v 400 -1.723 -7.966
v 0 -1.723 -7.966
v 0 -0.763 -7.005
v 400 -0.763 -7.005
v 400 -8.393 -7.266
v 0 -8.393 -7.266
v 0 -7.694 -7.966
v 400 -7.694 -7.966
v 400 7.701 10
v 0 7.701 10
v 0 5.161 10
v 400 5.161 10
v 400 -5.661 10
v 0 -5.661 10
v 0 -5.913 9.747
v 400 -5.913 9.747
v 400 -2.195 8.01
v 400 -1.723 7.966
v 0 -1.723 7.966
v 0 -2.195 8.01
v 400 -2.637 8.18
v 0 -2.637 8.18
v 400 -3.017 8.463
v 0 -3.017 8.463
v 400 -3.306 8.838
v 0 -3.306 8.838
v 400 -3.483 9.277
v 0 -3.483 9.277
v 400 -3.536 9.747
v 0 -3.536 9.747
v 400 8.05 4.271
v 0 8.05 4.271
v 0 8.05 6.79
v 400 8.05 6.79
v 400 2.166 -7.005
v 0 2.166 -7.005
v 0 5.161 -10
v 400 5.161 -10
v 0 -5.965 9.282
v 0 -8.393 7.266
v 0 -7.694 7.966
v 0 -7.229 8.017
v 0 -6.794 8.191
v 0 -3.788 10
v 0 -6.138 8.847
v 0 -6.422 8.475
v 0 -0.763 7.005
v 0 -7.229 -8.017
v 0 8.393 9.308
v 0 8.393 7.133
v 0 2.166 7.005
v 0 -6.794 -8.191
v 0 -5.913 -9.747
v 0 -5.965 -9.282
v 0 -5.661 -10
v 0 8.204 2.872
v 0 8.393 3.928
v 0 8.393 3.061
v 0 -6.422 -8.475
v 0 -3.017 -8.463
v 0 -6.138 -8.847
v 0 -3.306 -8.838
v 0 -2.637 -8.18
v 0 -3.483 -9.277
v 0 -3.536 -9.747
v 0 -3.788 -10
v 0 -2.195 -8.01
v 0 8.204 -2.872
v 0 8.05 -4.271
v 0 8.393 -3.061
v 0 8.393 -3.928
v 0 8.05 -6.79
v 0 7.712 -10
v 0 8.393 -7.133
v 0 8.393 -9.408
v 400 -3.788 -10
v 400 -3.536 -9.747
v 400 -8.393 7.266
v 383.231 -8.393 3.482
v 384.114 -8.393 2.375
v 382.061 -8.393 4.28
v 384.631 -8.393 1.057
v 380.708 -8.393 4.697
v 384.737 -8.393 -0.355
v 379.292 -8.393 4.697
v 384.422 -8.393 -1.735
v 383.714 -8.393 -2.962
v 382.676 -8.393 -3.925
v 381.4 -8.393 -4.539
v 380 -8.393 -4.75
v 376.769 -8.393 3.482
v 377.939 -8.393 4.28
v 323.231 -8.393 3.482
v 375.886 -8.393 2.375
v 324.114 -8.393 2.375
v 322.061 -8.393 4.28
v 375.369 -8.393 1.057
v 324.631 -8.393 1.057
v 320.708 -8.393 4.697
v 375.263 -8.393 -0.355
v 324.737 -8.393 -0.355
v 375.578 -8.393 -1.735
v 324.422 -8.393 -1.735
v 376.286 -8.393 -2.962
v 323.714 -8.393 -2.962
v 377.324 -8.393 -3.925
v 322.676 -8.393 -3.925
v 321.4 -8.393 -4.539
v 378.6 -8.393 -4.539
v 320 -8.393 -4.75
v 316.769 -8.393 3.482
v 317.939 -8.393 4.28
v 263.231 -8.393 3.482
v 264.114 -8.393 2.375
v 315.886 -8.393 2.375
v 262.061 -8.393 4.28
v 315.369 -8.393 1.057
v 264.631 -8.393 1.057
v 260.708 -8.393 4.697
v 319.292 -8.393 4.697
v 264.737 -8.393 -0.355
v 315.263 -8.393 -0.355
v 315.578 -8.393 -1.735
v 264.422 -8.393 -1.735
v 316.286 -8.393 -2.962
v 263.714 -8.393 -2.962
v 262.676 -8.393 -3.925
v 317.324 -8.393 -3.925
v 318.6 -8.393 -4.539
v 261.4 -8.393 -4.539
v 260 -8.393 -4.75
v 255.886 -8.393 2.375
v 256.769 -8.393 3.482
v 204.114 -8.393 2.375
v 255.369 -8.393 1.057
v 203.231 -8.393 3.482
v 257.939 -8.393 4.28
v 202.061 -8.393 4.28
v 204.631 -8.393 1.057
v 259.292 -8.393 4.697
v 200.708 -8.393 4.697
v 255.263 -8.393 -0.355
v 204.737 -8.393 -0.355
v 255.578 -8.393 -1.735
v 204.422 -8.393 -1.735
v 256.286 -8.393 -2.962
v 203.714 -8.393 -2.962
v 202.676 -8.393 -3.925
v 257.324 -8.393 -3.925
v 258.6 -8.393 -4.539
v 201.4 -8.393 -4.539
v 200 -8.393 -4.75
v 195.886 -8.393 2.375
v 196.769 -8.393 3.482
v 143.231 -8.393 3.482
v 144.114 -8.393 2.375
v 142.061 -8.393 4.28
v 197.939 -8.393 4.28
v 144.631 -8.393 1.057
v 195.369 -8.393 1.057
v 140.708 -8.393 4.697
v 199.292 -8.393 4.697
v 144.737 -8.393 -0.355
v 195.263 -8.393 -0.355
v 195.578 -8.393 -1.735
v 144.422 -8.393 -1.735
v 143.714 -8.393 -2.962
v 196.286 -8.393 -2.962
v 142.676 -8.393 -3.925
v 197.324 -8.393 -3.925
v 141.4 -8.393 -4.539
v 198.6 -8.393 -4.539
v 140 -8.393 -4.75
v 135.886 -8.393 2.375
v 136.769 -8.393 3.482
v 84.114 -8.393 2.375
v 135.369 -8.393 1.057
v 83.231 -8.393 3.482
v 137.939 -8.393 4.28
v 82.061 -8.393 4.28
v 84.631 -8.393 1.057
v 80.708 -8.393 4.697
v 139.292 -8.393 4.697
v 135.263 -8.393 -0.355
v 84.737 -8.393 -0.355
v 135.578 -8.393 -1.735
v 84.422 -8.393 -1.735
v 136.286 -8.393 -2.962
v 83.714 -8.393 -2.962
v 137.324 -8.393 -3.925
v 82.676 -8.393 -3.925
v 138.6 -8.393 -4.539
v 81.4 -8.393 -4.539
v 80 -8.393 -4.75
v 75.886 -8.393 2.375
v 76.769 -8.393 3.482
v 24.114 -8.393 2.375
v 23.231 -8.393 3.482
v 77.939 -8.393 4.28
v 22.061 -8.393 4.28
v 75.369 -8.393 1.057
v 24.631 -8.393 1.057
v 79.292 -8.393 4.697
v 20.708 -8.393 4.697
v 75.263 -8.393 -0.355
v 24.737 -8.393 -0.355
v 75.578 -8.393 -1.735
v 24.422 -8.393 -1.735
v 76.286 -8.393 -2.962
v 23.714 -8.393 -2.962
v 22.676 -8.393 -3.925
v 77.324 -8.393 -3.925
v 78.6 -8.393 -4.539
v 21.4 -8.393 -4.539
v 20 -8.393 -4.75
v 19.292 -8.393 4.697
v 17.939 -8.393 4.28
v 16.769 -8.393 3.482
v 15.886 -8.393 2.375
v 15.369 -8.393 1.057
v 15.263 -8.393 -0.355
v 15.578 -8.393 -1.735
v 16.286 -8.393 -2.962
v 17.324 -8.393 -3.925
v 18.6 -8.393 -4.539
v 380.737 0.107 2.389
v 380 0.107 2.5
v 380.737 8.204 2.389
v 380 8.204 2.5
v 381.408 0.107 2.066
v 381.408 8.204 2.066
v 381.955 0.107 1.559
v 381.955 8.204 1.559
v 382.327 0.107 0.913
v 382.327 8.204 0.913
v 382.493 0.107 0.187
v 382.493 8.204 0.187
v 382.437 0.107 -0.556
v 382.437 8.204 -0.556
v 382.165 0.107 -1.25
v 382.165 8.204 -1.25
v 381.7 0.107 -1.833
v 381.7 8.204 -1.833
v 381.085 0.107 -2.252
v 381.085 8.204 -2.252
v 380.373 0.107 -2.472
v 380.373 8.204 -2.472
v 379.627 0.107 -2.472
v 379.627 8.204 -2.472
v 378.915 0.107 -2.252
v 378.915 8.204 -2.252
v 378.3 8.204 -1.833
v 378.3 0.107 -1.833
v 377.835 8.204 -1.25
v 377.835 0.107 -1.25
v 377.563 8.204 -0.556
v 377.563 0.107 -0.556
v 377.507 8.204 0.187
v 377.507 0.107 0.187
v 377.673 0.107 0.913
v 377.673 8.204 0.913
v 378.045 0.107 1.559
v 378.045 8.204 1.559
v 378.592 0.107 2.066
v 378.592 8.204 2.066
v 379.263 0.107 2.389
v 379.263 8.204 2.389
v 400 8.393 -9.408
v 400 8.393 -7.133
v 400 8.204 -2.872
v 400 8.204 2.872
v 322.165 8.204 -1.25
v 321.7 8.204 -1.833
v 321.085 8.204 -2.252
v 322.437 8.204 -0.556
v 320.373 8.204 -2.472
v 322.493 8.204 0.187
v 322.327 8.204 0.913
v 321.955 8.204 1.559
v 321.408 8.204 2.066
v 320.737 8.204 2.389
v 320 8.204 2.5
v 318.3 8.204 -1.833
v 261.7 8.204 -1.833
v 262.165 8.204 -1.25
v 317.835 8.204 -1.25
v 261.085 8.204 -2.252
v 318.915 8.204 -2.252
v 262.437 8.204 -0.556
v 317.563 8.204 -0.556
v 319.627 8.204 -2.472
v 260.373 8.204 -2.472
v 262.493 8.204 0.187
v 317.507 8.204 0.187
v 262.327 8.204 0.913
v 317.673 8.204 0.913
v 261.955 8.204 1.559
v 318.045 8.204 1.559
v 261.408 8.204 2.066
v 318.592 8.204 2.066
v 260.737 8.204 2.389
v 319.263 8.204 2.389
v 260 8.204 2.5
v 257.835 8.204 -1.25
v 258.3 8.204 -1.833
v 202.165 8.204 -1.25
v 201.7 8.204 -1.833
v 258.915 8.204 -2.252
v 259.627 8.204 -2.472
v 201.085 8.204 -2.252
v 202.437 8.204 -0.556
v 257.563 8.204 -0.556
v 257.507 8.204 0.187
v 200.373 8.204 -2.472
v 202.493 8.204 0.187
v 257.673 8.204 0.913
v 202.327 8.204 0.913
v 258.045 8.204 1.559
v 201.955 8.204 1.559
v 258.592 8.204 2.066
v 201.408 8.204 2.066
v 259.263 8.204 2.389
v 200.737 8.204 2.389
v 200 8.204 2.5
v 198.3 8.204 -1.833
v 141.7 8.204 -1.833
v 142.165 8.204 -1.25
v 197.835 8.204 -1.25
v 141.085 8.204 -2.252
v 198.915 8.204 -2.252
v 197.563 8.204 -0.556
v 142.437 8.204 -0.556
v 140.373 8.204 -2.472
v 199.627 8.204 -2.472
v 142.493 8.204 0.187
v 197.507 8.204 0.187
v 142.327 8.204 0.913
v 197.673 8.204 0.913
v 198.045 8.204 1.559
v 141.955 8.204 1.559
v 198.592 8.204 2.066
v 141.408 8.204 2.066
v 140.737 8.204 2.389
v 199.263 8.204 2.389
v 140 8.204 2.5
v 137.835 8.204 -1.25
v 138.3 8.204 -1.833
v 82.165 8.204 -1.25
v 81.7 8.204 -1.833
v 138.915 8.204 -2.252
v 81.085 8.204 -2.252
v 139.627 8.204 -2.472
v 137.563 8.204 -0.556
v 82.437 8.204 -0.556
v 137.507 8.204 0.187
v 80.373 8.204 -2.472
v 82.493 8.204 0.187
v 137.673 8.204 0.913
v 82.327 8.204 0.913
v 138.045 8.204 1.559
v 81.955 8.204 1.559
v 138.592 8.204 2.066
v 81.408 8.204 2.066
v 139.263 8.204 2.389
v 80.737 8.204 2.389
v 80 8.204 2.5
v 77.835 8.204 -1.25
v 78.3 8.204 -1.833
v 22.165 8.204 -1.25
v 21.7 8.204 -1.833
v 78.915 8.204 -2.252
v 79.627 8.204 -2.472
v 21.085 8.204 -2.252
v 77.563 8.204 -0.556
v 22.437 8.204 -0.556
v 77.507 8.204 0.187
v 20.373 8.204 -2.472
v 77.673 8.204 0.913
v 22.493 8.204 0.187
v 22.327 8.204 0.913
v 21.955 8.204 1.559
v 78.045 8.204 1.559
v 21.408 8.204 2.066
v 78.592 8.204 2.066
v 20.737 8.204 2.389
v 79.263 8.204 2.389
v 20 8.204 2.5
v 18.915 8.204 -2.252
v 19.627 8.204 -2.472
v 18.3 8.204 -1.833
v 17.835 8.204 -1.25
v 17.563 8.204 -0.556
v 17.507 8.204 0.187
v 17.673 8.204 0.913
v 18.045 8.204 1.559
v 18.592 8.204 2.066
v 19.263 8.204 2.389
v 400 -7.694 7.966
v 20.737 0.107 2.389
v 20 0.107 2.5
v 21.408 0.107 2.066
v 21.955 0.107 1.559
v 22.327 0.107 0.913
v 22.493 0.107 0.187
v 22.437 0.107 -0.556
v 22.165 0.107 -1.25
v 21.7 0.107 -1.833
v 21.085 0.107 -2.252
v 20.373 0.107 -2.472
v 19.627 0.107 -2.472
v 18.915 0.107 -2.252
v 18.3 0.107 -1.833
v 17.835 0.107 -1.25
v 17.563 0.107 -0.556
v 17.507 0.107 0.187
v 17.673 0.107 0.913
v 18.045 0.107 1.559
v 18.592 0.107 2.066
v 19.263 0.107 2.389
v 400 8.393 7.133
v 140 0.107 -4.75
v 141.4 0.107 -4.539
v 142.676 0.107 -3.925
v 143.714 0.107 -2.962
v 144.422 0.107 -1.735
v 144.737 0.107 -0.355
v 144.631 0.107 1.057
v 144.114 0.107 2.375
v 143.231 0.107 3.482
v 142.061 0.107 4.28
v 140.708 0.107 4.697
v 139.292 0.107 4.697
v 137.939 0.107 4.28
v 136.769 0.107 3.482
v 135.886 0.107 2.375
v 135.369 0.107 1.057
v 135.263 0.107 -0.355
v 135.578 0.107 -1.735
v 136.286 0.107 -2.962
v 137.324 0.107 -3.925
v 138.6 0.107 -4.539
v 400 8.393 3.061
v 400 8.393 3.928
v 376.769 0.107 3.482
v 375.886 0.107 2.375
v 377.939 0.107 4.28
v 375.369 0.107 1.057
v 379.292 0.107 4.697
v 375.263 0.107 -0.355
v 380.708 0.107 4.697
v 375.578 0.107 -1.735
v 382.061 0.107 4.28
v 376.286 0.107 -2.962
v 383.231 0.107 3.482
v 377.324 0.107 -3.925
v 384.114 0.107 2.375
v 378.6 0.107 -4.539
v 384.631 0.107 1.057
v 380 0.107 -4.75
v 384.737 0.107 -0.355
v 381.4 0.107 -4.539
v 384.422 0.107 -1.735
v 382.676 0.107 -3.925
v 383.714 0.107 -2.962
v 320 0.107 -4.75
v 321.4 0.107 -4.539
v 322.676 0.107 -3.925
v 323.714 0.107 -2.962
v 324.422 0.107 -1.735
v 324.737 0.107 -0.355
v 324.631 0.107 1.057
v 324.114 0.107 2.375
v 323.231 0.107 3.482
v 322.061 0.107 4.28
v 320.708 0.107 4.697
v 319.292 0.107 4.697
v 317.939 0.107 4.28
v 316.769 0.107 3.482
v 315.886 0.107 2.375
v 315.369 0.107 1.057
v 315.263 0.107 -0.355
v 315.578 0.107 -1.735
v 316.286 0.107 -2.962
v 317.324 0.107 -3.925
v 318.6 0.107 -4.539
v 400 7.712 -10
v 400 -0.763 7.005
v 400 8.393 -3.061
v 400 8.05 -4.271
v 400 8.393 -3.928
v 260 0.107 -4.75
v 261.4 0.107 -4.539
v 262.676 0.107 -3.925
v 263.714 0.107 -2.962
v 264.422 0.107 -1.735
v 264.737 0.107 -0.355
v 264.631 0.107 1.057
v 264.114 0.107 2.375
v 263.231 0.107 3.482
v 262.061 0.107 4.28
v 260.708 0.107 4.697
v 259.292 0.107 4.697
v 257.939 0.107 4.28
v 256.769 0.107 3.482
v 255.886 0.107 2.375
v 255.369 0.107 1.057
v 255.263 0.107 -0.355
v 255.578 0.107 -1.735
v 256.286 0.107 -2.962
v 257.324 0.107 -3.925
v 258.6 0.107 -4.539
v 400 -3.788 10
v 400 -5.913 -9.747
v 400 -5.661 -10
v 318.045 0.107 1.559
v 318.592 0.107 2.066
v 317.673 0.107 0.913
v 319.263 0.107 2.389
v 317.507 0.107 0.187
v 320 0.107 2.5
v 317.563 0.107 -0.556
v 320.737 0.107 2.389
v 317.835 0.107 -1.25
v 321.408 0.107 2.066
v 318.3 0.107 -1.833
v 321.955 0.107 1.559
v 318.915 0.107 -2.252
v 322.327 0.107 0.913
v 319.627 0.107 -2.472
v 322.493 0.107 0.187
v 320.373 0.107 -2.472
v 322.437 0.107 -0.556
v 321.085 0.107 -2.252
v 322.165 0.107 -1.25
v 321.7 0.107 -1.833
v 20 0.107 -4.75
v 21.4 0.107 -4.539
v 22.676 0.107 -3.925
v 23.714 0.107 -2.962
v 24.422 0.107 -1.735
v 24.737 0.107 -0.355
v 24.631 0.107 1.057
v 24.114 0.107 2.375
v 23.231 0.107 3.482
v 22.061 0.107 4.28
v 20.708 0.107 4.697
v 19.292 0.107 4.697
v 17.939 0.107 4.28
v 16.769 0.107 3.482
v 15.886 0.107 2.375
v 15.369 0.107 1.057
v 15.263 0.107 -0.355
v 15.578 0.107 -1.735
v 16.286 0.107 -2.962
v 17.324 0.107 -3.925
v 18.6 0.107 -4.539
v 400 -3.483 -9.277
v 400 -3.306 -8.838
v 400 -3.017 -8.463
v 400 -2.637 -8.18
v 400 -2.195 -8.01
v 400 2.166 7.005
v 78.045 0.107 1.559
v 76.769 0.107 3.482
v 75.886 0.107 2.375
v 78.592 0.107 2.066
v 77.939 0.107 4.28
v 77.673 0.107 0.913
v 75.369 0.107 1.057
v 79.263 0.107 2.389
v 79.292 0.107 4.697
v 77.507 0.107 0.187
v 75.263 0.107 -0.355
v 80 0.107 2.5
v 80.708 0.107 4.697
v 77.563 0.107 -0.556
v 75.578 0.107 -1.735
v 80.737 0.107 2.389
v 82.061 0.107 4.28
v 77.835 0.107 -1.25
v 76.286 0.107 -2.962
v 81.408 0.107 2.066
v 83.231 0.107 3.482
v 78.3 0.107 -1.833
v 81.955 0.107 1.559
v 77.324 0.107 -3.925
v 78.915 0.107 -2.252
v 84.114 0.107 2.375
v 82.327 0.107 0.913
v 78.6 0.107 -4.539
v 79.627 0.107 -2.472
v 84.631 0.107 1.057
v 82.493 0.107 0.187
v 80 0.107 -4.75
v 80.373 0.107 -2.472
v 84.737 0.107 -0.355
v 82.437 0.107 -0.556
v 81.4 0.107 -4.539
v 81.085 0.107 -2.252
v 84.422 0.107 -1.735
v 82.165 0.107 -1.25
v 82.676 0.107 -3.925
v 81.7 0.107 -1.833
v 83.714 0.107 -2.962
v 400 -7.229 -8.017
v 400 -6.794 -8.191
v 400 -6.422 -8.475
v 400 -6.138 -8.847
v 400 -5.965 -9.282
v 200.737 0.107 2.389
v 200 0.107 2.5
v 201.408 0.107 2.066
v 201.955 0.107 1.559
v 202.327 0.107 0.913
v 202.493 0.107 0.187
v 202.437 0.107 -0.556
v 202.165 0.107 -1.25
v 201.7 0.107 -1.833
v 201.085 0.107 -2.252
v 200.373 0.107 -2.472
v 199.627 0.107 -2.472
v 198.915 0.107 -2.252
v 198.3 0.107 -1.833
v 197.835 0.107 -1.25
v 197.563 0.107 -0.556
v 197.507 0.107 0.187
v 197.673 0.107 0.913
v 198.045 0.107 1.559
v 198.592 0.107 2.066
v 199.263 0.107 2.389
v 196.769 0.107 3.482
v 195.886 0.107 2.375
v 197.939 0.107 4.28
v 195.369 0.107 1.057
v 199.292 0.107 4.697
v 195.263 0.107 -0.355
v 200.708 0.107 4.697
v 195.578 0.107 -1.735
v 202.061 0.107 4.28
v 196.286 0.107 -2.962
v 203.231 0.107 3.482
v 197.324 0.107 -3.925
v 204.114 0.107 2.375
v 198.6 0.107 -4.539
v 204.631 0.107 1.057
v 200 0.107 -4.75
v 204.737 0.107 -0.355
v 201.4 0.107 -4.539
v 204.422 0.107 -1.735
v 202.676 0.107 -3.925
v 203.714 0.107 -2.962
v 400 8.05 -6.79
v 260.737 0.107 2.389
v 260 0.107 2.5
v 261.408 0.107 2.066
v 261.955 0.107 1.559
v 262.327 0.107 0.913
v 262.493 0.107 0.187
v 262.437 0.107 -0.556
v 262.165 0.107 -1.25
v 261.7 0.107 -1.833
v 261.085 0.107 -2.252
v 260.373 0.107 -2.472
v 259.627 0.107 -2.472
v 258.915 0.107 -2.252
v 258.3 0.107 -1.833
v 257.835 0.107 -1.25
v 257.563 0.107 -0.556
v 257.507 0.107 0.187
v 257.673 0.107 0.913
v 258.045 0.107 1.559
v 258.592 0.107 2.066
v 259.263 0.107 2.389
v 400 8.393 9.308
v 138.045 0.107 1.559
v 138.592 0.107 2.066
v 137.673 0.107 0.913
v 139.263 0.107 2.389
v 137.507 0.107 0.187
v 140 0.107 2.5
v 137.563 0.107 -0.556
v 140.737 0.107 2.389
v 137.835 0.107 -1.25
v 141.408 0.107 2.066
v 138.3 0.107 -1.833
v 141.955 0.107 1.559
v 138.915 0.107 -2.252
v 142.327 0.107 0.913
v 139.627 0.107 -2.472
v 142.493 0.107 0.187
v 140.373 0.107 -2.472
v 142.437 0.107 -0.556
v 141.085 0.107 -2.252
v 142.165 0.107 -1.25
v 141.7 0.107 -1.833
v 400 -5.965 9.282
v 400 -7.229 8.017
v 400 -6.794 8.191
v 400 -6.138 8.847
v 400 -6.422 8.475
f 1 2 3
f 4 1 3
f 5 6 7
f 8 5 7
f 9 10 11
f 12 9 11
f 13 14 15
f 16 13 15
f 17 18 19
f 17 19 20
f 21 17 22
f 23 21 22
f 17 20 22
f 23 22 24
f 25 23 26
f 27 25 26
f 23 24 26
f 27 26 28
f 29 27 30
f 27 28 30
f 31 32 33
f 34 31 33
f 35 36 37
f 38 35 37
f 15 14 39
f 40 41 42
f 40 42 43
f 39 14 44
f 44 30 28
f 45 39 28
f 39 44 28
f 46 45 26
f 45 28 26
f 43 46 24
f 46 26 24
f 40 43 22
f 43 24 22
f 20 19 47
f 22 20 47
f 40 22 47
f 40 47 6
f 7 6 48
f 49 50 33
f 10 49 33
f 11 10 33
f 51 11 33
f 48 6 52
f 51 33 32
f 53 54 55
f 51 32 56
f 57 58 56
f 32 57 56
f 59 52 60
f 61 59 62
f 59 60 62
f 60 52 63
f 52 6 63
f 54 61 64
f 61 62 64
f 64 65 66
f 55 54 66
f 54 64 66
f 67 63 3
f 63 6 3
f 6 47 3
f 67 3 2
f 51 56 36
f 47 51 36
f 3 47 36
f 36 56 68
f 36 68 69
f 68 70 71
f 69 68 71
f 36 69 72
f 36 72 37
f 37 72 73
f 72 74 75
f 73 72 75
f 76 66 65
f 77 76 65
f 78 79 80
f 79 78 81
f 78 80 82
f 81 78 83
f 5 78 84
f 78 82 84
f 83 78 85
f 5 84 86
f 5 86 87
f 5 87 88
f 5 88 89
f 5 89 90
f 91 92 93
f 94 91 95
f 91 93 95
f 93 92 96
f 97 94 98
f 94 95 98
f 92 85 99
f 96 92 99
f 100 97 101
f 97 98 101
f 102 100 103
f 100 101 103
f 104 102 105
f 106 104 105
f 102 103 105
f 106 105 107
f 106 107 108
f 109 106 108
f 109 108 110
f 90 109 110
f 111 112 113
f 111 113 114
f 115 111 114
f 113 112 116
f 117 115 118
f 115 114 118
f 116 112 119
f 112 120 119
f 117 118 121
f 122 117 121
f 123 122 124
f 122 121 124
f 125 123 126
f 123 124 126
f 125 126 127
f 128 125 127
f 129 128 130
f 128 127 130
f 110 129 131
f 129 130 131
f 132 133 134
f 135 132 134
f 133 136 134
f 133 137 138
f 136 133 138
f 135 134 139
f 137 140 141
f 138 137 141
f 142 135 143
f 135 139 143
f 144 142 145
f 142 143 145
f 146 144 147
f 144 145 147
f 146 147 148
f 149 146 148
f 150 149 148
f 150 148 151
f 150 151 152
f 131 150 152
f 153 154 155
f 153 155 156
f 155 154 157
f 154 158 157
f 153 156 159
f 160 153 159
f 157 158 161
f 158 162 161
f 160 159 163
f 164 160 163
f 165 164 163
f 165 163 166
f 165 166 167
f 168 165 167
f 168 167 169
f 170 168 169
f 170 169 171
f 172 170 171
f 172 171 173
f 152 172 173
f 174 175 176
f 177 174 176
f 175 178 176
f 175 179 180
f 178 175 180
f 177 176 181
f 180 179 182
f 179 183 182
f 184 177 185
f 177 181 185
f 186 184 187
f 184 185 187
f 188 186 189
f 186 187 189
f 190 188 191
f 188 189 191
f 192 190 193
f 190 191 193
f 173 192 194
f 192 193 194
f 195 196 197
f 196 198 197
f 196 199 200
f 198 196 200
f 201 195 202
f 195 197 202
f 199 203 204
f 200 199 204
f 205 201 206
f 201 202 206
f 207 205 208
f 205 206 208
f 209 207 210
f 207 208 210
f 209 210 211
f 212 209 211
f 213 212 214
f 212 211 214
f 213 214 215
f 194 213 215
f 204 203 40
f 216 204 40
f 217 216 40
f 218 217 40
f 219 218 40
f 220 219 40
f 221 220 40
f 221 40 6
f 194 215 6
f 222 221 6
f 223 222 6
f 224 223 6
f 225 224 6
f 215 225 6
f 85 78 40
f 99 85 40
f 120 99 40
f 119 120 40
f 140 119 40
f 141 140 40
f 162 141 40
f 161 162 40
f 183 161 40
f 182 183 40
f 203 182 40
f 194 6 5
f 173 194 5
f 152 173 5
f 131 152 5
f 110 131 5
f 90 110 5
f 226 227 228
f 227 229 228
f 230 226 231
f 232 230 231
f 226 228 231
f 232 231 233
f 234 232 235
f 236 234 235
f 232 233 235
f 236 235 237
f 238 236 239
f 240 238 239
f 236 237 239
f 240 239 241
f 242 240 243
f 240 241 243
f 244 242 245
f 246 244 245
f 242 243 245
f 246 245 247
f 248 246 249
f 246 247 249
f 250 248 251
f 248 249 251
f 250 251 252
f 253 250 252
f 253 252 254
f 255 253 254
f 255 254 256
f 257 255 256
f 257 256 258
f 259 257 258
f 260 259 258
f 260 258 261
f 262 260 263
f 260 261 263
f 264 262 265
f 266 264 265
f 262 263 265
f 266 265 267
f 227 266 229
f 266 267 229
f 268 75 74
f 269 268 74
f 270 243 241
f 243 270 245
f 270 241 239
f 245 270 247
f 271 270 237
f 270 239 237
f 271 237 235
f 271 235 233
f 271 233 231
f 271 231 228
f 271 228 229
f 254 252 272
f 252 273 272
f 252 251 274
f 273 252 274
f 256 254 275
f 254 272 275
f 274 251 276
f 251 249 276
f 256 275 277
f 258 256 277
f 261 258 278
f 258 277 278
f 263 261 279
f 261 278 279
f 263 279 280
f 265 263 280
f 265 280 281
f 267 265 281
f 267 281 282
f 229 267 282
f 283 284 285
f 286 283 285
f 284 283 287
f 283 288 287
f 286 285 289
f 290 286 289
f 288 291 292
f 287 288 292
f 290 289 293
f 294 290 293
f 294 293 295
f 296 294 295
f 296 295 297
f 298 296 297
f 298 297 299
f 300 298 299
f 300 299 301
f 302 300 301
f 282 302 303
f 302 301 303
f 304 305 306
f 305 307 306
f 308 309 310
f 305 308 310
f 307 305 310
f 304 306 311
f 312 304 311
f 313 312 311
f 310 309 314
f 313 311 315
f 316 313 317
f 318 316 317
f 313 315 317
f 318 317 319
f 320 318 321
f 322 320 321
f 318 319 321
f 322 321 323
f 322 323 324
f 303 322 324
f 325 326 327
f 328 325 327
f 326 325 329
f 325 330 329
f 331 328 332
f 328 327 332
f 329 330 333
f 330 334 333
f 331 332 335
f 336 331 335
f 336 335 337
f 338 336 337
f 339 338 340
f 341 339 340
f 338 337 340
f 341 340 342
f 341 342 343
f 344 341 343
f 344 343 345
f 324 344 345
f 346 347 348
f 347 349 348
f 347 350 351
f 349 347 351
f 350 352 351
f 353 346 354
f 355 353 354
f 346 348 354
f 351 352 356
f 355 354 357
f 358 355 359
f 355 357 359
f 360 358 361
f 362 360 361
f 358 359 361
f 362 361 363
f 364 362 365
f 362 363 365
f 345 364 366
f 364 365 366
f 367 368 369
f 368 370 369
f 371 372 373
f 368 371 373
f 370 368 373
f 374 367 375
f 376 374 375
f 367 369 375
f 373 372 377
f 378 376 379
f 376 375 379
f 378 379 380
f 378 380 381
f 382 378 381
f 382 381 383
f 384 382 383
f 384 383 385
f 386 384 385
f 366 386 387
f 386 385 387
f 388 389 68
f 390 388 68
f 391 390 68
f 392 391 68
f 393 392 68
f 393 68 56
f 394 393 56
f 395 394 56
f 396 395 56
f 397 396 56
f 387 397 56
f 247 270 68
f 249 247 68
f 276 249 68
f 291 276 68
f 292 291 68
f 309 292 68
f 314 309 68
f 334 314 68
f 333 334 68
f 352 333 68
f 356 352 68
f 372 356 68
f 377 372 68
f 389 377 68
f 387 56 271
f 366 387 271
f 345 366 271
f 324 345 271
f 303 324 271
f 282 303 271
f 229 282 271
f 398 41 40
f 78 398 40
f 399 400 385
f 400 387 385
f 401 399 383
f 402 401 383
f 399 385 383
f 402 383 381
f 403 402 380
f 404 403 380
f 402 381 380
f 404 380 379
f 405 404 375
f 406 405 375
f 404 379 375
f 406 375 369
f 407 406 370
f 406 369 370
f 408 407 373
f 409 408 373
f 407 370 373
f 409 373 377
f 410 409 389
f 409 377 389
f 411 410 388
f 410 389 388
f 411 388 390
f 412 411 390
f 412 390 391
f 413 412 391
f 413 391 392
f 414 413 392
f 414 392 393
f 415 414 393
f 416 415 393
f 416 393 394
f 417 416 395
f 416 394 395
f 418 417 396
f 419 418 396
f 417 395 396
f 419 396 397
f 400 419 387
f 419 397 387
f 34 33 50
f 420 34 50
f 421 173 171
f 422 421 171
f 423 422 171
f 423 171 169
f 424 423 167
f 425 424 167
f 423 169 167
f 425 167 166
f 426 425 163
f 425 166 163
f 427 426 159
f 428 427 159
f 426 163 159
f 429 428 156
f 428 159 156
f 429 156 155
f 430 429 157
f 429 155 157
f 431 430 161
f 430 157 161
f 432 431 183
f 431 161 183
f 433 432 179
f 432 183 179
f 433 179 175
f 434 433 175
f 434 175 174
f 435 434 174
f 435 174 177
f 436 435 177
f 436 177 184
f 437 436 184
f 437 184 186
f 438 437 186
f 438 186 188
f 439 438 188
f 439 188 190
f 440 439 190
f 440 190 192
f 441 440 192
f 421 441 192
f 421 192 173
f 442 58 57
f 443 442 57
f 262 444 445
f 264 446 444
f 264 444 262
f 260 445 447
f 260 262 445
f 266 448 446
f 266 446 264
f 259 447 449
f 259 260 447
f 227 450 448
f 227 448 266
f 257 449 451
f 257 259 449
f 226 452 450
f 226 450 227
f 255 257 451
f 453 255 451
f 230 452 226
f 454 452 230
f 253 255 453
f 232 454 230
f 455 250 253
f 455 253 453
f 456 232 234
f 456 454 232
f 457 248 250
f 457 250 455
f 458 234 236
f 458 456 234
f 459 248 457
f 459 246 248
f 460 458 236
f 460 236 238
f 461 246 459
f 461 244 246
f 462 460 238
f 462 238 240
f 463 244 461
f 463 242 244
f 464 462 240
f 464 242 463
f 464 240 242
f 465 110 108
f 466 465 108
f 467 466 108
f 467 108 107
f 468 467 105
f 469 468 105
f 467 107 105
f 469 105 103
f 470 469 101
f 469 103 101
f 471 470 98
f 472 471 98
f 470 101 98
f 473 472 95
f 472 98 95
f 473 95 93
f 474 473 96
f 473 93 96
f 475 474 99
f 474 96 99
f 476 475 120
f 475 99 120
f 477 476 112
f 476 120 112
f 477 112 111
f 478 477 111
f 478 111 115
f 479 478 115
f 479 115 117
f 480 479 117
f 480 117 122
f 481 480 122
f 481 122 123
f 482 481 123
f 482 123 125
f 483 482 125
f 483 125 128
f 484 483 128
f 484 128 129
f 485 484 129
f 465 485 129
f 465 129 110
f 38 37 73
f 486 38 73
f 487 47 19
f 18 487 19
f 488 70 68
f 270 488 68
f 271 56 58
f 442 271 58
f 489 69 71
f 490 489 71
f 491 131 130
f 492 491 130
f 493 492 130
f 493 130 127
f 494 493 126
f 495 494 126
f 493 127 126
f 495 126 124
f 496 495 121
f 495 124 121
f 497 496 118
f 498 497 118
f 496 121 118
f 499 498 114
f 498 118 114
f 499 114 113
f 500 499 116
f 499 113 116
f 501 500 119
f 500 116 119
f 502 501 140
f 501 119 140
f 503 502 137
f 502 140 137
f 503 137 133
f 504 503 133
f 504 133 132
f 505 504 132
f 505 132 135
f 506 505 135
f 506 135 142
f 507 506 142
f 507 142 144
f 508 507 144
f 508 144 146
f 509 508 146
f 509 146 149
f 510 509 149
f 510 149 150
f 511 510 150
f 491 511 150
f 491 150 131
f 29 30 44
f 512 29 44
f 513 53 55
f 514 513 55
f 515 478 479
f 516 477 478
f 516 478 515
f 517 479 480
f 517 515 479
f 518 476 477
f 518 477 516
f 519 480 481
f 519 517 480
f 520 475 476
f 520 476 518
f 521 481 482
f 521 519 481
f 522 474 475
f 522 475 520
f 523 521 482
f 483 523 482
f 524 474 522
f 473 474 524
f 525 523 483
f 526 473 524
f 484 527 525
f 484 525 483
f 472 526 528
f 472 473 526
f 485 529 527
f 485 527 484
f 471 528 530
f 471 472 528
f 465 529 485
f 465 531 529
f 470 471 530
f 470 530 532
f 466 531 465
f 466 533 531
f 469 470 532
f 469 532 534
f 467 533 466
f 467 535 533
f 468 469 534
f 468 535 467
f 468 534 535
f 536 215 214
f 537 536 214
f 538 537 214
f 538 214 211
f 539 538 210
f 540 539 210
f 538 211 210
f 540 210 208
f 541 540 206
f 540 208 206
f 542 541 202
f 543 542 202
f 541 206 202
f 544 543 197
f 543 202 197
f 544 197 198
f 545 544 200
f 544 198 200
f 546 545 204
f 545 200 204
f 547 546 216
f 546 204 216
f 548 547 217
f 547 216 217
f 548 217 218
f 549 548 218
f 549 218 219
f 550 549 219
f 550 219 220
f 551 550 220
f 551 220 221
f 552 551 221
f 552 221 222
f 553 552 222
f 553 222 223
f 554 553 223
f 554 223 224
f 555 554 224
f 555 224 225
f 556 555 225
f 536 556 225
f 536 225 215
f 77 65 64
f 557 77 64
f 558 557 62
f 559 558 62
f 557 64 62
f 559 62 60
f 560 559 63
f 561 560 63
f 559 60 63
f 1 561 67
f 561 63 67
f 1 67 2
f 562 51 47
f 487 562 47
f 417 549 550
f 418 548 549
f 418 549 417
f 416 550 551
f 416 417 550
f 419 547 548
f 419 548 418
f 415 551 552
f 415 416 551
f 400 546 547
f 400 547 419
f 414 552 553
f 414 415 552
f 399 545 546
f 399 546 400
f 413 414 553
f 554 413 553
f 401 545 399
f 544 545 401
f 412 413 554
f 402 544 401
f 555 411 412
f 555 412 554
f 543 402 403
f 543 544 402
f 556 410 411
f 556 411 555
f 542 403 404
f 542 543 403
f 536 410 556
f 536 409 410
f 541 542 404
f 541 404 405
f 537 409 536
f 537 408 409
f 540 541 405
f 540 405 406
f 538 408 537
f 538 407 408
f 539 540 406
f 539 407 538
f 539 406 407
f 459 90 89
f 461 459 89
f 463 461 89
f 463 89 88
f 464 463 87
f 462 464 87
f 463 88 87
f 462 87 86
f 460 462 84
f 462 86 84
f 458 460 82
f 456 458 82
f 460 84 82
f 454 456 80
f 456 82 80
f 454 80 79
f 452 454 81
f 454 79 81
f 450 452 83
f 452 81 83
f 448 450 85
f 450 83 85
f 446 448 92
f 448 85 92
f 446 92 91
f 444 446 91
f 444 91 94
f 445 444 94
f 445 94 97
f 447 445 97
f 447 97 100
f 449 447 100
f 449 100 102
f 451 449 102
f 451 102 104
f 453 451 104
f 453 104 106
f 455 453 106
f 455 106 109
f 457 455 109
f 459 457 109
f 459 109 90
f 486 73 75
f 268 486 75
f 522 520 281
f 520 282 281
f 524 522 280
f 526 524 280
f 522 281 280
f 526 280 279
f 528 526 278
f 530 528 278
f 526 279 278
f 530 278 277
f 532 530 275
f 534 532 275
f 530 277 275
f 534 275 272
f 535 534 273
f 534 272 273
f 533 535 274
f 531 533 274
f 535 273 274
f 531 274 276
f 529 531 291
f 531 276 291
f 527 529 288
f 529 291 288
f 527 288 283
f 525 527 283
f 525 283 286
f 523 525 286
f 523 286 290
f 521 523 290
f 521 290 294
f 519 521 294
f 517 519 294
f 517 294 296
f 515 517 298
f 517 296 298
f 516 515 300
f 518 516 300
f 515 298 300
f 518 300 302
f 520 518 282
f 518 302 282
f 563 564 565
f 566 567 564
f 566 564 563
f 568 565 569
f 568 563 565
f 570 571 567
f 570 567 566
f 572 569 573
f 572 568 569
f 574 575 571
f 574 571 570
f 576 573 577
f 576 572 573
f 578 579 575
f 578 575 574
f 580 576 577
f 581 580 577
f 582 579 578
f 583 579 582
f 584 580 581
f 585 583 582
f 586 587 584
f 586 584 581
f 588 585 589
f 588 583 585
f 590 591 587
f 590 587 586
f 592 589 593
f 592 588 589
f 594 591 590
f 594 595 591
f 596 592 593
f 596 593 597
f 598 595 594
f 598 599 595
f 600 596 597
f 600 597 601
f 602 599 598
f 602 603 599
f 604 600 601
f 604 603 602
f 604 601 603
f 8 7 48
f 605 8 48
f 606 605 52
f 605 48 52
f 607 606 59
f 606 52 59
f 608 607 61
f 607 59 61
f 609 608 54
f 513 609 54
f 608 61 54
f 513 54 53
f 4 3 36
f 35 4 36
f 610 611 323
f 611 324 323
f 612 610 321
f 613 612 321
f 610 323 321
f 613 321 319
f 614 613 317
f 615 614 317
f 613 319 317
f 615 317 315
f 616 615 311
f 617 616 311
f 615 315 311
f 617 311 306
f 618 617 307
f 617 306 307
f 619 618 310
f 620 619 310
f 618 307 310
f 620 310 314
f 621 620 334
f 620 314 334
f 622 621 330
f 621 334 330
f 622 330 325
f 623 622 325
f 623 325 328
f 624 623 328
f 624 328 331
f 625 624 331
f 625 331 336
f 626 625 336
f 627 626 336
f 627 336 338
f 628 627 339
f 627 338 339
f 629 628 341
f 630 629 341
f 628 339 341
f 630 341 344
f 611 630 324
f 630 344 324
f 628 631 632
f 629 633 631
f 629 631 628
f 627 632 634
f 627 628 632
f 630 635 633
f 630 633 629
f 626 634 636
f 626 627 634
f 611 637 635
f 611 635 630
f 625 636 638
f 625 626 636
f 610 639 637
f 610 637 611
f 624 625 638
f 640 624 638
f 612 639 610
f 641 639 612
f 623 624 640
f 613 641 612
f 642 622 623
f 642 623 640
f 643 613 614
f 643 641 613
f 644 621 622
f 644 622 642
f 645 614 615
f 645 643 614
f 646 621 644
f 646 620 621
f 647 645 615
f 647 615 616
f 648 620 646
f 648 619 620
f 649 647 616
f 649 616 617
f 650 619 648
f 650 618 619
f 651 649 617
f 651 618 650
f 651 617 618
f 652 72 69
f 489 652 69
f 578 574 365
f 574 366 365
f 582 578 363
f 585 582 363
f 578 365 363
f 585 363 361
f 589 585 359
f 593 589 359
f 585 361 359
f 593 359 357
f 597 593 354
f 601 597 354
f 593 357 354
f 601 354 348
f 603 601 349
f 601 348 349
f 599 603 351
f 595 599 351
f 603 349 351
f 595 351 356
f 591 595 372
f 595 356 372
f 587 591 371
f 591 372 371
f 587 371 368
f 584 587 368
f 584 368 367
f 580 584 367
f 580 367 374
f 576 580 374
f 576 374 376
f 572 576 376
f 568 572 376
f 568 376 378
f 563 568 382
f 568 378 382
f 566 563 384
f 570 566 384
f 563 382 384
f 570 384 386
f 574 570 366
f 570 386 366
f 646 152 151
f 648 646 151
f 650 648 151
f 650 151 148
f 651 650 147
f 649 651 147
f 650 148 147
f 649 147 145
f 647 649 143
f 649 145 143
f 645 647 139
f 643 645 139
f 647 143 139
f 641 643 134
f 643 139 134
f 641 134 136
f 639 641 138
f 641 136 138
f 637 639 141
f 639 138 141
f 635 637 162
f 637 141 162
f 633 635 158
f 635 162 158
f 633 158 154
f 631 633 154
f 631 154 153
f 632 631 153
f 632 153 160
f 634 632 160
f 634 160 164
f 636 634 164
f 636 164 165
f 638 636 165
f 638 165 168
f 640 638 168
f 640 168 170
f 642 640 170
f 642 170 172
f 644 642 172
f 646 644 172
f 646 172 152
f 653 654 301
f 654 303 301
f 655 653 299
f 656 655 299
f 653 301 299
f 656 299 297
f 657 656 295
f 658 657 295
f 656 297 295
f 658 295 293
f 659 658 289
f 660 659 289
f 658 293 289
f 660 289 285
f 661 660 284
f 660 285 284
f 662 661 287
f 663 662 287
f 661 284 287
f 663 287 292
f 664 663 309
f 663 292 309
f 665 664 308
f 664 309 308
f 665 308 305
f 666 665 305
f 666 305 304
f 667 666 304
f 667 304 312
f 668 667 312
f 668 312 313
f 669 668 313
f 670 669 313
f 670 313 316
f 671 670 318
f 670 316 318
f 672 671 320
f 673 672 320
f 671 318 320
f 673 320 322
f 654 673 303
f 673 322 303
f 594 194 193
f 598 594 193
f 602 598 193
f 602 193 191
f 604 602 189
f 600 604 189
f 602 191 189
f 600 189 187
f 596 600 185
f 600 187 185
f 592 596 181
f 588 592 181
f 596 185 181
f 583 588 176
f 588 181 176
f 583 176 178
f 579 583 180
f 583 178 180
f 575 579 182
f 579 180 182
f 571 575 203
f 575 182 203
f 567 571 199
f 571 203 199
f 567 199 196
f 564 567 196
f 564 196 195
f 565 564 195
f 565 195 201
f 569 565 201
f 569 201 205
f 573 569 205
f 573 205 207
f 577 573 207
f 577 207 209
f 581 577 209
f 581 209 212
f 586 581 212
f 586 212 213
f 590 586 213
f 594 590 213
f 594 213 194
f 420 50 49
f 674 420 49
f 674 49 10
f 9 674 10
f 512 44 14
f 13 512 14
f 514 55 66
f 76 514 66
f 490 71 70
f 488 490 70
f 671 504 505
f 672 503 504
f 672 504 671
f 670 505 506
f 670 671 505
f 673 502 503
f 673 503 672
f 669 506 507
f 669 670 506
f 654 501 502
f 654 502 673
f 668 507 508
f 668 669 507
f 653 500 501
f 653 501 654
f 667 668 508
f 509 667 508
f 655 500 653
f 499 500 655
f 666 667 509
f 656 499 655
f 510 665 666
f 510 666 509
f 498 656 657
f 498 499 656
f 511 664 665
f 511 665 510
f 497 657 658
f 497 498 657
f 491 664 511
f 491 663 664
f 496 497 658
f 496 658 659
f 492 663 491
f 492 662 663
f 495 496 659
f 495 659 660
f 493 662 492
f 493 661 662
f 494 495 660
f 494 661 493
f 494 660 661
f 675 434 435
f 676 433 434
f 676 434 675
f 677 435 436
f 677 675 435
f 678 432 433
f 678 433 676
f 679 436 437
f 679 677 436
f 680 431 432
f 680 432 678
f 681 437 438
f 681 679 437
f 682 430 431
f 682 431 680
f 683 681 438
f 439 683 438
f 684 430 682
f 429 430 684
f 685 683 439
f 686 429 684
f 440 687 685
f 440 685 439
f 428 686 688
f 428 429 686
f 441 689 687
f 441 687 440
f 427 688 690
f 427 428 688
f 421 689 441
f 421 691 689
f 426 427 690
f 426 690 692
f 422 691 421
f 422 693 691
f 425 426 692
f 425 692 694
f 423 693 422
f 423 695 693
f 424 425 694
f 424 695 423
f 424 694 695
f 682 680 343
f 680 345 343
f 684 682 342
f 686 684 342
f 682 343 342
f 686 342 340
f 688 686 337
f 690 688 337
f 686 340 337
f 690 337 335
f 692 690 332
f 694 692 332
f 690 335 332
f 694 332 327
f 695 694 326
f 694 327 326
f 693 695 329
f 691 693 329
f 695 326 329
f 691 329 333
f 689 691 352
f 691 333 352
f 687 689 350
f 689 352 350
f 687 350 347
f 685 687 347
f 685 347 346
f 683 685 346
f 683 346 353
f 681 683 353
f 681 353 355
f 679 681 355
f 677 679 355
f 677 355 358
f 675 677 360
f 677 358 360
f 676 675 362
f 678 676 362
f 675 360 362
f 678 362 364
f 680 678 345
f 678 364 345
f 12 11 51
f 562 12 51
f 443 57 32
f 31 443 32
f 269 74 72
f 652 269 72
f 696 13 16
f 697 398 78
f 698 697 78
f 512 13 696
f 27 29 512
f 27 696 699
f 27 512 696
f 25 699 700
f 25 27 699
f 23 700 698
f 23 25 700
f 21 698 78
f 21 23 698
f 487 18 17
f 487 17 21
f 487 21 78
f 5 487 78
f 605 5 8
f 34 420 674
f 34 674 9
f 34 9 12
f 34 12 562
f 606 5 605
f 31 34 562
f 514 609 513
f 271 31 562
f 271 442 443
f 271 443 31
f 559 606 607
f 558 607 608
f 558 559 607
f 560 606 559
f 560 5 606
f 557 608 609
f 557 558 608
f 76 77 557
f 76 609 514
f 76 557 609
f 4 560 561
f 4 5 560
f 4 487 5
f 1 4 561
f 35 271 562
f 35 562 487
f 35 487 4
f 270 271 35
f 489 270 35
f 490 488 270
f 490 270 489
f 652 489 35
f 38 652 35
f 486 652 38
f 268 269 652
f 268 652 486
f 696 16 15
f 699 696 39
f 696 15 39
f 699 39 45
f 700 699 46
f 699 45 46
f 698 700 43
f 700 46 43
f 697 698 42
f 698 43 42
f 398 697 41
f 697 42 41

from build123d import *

# Parameters (mm, degrees)
BOSS_EXTRUDE1_DEPTH = 400
HOLE1_D             = 5
HOLE1_CBORE_D       = 9.5
HOLE1_CBORE_DEPTH   = 8.5
LPATTERN1_COUNT     = 7
LPATTERN1_PITCH     = 60


with BuildPart() as part:
    # Sketch1 → Boss-Extrude1 (new body)
    with BuildSketch(Plane(origin=(0, 0, 0), x_dir=(0, 0, -1), z_dir=(1, 0, 0))):
        with BuildLine():
            Line((-7.965754986, -7.693975449), (-7.266272068, -8.393458366))
            Line((-7.266272068, -8.393458366), (7.266272068, -8.393458366))
            Line((7.266272068, -8.393458366), (7.965754986, -7.693975449))
            ThreePointArc((7.965754986, -7.693975449), (8.474723757, -6.421557866), (9.747437917, -5.913331162))
            Line((9.747437917, -5.913331162), (10.000000437, -5.660768637))
            Line((10.000000437, -5.660768637), (10.000000437, -3.788406023))
            Line((10.000000437, -3.788406023), (9.747437912, -3.535843503))
            ThreePointArc((9.747437912, -3.535843503), (8.462742055, -3.016656911), (7.965755402, -1.72321096))
            Line((7.965755402, -1.72321096), (7.005148341, -0.762603918))
            Line((7.005148341, -0.762603918), (7.005148341, 2.166206023))
            Line((7.005148341, 2.166206023), (10.000000347, 5.161058089))
            Line((10.000000347, 5.161058089), (10.000000347, 7.712387211))
            Line((10.000000347, 7.712387211), (9.408464779, 8.393458268))
            Line((9.408464779, 8.393458268), (7.133016457, 8.393458268))
            Line((7.133016457, 8.393458268), (6.789534443, 8.049976247))
            Line((6.789534443, 8.049976247), (4.271139656, 8.049976247))
            Line((4.271139656, 8.049976247), (3.927707784, 8.393458265))
            Line((3.927707784, 8.393458265), (3.061282509, 8.393458265))
            Line((3.061282509, 8.393458265), (2.872049327, 8.204225079))
            Line((2.872049327, 8.204225079), (-2.87204886, 8.204225079))
            Line((-2.87204886, 8.204225079), (-3.061282046, 8.393458261))
            Line((-3.061282046, 8.393458261), (-3.927707321, 8.393458261))
            Line((-3.927707321, 8.393458261), (-4.271189216, 8.049976359))
            Line((-4.271189216, 8.049976359), (-6.789534095, 8.049976359))
            Line((-6.789534095, 8.049976359), (-7.133016116, 8.393458373))
            Line((-7.133016116, 8.393458373), (-9.30771733, 8.393458373))
            Line((-9.30771733, 8.393458373), (-10, 7.70117569))
            Line((-10, 7.70117569), (-10, 5.161058187))
            Line((-10, 5.161058187), (-7.005147934, 2.166206181))
            Line((-7.005147934, 2.166206181), (-7.005147934, -0.76260376))
            Line((-7.005147934, -0.76260376), (-7.965754986, -1.723210812))
            ThreePointArc((-7.965754986, -1.723210812), (-8.462741848, -3.016656549), (-9.747437477, -3.535843372))
            Line((-9.747437477, -3.535843372), (-10, -3.788405895))
            Line((-10, -3.788405895), (-10, -5.660768509))
            Line((-10, -5.660768509), (-9.747437477, -5.913331032))
            ThreePointArc((-9.747437477, -5.913331032), (-8.474723558, -6.421557943), (-7.965754986, -7.693975449))
        make_face()
    extrude(amount=BOSS_EXTRUDE1_DEPTH)

    # Hole1 (through all)
    with Locations(Plane(origin=(20, -8.393458366, 0), x_dir=(0, 0, -1), z_dir=(0, -1, 0))):
        with Locations((0, 0)):
            hole1 = CounterBoreHole(HOLE1_D / 2, HOLE1_CBORE_D / 2, HOLE1_CBORE_DEPTH)

    # LPattern1: Hole1 ×7
    with Locations(*[(i * LPATTERN1_PITCH, 0, 0) for i in range(1, LPATTERN1_COUNT)]):
        add(hole1, mode=Mode.SUBTRACT)


solid = part.part
